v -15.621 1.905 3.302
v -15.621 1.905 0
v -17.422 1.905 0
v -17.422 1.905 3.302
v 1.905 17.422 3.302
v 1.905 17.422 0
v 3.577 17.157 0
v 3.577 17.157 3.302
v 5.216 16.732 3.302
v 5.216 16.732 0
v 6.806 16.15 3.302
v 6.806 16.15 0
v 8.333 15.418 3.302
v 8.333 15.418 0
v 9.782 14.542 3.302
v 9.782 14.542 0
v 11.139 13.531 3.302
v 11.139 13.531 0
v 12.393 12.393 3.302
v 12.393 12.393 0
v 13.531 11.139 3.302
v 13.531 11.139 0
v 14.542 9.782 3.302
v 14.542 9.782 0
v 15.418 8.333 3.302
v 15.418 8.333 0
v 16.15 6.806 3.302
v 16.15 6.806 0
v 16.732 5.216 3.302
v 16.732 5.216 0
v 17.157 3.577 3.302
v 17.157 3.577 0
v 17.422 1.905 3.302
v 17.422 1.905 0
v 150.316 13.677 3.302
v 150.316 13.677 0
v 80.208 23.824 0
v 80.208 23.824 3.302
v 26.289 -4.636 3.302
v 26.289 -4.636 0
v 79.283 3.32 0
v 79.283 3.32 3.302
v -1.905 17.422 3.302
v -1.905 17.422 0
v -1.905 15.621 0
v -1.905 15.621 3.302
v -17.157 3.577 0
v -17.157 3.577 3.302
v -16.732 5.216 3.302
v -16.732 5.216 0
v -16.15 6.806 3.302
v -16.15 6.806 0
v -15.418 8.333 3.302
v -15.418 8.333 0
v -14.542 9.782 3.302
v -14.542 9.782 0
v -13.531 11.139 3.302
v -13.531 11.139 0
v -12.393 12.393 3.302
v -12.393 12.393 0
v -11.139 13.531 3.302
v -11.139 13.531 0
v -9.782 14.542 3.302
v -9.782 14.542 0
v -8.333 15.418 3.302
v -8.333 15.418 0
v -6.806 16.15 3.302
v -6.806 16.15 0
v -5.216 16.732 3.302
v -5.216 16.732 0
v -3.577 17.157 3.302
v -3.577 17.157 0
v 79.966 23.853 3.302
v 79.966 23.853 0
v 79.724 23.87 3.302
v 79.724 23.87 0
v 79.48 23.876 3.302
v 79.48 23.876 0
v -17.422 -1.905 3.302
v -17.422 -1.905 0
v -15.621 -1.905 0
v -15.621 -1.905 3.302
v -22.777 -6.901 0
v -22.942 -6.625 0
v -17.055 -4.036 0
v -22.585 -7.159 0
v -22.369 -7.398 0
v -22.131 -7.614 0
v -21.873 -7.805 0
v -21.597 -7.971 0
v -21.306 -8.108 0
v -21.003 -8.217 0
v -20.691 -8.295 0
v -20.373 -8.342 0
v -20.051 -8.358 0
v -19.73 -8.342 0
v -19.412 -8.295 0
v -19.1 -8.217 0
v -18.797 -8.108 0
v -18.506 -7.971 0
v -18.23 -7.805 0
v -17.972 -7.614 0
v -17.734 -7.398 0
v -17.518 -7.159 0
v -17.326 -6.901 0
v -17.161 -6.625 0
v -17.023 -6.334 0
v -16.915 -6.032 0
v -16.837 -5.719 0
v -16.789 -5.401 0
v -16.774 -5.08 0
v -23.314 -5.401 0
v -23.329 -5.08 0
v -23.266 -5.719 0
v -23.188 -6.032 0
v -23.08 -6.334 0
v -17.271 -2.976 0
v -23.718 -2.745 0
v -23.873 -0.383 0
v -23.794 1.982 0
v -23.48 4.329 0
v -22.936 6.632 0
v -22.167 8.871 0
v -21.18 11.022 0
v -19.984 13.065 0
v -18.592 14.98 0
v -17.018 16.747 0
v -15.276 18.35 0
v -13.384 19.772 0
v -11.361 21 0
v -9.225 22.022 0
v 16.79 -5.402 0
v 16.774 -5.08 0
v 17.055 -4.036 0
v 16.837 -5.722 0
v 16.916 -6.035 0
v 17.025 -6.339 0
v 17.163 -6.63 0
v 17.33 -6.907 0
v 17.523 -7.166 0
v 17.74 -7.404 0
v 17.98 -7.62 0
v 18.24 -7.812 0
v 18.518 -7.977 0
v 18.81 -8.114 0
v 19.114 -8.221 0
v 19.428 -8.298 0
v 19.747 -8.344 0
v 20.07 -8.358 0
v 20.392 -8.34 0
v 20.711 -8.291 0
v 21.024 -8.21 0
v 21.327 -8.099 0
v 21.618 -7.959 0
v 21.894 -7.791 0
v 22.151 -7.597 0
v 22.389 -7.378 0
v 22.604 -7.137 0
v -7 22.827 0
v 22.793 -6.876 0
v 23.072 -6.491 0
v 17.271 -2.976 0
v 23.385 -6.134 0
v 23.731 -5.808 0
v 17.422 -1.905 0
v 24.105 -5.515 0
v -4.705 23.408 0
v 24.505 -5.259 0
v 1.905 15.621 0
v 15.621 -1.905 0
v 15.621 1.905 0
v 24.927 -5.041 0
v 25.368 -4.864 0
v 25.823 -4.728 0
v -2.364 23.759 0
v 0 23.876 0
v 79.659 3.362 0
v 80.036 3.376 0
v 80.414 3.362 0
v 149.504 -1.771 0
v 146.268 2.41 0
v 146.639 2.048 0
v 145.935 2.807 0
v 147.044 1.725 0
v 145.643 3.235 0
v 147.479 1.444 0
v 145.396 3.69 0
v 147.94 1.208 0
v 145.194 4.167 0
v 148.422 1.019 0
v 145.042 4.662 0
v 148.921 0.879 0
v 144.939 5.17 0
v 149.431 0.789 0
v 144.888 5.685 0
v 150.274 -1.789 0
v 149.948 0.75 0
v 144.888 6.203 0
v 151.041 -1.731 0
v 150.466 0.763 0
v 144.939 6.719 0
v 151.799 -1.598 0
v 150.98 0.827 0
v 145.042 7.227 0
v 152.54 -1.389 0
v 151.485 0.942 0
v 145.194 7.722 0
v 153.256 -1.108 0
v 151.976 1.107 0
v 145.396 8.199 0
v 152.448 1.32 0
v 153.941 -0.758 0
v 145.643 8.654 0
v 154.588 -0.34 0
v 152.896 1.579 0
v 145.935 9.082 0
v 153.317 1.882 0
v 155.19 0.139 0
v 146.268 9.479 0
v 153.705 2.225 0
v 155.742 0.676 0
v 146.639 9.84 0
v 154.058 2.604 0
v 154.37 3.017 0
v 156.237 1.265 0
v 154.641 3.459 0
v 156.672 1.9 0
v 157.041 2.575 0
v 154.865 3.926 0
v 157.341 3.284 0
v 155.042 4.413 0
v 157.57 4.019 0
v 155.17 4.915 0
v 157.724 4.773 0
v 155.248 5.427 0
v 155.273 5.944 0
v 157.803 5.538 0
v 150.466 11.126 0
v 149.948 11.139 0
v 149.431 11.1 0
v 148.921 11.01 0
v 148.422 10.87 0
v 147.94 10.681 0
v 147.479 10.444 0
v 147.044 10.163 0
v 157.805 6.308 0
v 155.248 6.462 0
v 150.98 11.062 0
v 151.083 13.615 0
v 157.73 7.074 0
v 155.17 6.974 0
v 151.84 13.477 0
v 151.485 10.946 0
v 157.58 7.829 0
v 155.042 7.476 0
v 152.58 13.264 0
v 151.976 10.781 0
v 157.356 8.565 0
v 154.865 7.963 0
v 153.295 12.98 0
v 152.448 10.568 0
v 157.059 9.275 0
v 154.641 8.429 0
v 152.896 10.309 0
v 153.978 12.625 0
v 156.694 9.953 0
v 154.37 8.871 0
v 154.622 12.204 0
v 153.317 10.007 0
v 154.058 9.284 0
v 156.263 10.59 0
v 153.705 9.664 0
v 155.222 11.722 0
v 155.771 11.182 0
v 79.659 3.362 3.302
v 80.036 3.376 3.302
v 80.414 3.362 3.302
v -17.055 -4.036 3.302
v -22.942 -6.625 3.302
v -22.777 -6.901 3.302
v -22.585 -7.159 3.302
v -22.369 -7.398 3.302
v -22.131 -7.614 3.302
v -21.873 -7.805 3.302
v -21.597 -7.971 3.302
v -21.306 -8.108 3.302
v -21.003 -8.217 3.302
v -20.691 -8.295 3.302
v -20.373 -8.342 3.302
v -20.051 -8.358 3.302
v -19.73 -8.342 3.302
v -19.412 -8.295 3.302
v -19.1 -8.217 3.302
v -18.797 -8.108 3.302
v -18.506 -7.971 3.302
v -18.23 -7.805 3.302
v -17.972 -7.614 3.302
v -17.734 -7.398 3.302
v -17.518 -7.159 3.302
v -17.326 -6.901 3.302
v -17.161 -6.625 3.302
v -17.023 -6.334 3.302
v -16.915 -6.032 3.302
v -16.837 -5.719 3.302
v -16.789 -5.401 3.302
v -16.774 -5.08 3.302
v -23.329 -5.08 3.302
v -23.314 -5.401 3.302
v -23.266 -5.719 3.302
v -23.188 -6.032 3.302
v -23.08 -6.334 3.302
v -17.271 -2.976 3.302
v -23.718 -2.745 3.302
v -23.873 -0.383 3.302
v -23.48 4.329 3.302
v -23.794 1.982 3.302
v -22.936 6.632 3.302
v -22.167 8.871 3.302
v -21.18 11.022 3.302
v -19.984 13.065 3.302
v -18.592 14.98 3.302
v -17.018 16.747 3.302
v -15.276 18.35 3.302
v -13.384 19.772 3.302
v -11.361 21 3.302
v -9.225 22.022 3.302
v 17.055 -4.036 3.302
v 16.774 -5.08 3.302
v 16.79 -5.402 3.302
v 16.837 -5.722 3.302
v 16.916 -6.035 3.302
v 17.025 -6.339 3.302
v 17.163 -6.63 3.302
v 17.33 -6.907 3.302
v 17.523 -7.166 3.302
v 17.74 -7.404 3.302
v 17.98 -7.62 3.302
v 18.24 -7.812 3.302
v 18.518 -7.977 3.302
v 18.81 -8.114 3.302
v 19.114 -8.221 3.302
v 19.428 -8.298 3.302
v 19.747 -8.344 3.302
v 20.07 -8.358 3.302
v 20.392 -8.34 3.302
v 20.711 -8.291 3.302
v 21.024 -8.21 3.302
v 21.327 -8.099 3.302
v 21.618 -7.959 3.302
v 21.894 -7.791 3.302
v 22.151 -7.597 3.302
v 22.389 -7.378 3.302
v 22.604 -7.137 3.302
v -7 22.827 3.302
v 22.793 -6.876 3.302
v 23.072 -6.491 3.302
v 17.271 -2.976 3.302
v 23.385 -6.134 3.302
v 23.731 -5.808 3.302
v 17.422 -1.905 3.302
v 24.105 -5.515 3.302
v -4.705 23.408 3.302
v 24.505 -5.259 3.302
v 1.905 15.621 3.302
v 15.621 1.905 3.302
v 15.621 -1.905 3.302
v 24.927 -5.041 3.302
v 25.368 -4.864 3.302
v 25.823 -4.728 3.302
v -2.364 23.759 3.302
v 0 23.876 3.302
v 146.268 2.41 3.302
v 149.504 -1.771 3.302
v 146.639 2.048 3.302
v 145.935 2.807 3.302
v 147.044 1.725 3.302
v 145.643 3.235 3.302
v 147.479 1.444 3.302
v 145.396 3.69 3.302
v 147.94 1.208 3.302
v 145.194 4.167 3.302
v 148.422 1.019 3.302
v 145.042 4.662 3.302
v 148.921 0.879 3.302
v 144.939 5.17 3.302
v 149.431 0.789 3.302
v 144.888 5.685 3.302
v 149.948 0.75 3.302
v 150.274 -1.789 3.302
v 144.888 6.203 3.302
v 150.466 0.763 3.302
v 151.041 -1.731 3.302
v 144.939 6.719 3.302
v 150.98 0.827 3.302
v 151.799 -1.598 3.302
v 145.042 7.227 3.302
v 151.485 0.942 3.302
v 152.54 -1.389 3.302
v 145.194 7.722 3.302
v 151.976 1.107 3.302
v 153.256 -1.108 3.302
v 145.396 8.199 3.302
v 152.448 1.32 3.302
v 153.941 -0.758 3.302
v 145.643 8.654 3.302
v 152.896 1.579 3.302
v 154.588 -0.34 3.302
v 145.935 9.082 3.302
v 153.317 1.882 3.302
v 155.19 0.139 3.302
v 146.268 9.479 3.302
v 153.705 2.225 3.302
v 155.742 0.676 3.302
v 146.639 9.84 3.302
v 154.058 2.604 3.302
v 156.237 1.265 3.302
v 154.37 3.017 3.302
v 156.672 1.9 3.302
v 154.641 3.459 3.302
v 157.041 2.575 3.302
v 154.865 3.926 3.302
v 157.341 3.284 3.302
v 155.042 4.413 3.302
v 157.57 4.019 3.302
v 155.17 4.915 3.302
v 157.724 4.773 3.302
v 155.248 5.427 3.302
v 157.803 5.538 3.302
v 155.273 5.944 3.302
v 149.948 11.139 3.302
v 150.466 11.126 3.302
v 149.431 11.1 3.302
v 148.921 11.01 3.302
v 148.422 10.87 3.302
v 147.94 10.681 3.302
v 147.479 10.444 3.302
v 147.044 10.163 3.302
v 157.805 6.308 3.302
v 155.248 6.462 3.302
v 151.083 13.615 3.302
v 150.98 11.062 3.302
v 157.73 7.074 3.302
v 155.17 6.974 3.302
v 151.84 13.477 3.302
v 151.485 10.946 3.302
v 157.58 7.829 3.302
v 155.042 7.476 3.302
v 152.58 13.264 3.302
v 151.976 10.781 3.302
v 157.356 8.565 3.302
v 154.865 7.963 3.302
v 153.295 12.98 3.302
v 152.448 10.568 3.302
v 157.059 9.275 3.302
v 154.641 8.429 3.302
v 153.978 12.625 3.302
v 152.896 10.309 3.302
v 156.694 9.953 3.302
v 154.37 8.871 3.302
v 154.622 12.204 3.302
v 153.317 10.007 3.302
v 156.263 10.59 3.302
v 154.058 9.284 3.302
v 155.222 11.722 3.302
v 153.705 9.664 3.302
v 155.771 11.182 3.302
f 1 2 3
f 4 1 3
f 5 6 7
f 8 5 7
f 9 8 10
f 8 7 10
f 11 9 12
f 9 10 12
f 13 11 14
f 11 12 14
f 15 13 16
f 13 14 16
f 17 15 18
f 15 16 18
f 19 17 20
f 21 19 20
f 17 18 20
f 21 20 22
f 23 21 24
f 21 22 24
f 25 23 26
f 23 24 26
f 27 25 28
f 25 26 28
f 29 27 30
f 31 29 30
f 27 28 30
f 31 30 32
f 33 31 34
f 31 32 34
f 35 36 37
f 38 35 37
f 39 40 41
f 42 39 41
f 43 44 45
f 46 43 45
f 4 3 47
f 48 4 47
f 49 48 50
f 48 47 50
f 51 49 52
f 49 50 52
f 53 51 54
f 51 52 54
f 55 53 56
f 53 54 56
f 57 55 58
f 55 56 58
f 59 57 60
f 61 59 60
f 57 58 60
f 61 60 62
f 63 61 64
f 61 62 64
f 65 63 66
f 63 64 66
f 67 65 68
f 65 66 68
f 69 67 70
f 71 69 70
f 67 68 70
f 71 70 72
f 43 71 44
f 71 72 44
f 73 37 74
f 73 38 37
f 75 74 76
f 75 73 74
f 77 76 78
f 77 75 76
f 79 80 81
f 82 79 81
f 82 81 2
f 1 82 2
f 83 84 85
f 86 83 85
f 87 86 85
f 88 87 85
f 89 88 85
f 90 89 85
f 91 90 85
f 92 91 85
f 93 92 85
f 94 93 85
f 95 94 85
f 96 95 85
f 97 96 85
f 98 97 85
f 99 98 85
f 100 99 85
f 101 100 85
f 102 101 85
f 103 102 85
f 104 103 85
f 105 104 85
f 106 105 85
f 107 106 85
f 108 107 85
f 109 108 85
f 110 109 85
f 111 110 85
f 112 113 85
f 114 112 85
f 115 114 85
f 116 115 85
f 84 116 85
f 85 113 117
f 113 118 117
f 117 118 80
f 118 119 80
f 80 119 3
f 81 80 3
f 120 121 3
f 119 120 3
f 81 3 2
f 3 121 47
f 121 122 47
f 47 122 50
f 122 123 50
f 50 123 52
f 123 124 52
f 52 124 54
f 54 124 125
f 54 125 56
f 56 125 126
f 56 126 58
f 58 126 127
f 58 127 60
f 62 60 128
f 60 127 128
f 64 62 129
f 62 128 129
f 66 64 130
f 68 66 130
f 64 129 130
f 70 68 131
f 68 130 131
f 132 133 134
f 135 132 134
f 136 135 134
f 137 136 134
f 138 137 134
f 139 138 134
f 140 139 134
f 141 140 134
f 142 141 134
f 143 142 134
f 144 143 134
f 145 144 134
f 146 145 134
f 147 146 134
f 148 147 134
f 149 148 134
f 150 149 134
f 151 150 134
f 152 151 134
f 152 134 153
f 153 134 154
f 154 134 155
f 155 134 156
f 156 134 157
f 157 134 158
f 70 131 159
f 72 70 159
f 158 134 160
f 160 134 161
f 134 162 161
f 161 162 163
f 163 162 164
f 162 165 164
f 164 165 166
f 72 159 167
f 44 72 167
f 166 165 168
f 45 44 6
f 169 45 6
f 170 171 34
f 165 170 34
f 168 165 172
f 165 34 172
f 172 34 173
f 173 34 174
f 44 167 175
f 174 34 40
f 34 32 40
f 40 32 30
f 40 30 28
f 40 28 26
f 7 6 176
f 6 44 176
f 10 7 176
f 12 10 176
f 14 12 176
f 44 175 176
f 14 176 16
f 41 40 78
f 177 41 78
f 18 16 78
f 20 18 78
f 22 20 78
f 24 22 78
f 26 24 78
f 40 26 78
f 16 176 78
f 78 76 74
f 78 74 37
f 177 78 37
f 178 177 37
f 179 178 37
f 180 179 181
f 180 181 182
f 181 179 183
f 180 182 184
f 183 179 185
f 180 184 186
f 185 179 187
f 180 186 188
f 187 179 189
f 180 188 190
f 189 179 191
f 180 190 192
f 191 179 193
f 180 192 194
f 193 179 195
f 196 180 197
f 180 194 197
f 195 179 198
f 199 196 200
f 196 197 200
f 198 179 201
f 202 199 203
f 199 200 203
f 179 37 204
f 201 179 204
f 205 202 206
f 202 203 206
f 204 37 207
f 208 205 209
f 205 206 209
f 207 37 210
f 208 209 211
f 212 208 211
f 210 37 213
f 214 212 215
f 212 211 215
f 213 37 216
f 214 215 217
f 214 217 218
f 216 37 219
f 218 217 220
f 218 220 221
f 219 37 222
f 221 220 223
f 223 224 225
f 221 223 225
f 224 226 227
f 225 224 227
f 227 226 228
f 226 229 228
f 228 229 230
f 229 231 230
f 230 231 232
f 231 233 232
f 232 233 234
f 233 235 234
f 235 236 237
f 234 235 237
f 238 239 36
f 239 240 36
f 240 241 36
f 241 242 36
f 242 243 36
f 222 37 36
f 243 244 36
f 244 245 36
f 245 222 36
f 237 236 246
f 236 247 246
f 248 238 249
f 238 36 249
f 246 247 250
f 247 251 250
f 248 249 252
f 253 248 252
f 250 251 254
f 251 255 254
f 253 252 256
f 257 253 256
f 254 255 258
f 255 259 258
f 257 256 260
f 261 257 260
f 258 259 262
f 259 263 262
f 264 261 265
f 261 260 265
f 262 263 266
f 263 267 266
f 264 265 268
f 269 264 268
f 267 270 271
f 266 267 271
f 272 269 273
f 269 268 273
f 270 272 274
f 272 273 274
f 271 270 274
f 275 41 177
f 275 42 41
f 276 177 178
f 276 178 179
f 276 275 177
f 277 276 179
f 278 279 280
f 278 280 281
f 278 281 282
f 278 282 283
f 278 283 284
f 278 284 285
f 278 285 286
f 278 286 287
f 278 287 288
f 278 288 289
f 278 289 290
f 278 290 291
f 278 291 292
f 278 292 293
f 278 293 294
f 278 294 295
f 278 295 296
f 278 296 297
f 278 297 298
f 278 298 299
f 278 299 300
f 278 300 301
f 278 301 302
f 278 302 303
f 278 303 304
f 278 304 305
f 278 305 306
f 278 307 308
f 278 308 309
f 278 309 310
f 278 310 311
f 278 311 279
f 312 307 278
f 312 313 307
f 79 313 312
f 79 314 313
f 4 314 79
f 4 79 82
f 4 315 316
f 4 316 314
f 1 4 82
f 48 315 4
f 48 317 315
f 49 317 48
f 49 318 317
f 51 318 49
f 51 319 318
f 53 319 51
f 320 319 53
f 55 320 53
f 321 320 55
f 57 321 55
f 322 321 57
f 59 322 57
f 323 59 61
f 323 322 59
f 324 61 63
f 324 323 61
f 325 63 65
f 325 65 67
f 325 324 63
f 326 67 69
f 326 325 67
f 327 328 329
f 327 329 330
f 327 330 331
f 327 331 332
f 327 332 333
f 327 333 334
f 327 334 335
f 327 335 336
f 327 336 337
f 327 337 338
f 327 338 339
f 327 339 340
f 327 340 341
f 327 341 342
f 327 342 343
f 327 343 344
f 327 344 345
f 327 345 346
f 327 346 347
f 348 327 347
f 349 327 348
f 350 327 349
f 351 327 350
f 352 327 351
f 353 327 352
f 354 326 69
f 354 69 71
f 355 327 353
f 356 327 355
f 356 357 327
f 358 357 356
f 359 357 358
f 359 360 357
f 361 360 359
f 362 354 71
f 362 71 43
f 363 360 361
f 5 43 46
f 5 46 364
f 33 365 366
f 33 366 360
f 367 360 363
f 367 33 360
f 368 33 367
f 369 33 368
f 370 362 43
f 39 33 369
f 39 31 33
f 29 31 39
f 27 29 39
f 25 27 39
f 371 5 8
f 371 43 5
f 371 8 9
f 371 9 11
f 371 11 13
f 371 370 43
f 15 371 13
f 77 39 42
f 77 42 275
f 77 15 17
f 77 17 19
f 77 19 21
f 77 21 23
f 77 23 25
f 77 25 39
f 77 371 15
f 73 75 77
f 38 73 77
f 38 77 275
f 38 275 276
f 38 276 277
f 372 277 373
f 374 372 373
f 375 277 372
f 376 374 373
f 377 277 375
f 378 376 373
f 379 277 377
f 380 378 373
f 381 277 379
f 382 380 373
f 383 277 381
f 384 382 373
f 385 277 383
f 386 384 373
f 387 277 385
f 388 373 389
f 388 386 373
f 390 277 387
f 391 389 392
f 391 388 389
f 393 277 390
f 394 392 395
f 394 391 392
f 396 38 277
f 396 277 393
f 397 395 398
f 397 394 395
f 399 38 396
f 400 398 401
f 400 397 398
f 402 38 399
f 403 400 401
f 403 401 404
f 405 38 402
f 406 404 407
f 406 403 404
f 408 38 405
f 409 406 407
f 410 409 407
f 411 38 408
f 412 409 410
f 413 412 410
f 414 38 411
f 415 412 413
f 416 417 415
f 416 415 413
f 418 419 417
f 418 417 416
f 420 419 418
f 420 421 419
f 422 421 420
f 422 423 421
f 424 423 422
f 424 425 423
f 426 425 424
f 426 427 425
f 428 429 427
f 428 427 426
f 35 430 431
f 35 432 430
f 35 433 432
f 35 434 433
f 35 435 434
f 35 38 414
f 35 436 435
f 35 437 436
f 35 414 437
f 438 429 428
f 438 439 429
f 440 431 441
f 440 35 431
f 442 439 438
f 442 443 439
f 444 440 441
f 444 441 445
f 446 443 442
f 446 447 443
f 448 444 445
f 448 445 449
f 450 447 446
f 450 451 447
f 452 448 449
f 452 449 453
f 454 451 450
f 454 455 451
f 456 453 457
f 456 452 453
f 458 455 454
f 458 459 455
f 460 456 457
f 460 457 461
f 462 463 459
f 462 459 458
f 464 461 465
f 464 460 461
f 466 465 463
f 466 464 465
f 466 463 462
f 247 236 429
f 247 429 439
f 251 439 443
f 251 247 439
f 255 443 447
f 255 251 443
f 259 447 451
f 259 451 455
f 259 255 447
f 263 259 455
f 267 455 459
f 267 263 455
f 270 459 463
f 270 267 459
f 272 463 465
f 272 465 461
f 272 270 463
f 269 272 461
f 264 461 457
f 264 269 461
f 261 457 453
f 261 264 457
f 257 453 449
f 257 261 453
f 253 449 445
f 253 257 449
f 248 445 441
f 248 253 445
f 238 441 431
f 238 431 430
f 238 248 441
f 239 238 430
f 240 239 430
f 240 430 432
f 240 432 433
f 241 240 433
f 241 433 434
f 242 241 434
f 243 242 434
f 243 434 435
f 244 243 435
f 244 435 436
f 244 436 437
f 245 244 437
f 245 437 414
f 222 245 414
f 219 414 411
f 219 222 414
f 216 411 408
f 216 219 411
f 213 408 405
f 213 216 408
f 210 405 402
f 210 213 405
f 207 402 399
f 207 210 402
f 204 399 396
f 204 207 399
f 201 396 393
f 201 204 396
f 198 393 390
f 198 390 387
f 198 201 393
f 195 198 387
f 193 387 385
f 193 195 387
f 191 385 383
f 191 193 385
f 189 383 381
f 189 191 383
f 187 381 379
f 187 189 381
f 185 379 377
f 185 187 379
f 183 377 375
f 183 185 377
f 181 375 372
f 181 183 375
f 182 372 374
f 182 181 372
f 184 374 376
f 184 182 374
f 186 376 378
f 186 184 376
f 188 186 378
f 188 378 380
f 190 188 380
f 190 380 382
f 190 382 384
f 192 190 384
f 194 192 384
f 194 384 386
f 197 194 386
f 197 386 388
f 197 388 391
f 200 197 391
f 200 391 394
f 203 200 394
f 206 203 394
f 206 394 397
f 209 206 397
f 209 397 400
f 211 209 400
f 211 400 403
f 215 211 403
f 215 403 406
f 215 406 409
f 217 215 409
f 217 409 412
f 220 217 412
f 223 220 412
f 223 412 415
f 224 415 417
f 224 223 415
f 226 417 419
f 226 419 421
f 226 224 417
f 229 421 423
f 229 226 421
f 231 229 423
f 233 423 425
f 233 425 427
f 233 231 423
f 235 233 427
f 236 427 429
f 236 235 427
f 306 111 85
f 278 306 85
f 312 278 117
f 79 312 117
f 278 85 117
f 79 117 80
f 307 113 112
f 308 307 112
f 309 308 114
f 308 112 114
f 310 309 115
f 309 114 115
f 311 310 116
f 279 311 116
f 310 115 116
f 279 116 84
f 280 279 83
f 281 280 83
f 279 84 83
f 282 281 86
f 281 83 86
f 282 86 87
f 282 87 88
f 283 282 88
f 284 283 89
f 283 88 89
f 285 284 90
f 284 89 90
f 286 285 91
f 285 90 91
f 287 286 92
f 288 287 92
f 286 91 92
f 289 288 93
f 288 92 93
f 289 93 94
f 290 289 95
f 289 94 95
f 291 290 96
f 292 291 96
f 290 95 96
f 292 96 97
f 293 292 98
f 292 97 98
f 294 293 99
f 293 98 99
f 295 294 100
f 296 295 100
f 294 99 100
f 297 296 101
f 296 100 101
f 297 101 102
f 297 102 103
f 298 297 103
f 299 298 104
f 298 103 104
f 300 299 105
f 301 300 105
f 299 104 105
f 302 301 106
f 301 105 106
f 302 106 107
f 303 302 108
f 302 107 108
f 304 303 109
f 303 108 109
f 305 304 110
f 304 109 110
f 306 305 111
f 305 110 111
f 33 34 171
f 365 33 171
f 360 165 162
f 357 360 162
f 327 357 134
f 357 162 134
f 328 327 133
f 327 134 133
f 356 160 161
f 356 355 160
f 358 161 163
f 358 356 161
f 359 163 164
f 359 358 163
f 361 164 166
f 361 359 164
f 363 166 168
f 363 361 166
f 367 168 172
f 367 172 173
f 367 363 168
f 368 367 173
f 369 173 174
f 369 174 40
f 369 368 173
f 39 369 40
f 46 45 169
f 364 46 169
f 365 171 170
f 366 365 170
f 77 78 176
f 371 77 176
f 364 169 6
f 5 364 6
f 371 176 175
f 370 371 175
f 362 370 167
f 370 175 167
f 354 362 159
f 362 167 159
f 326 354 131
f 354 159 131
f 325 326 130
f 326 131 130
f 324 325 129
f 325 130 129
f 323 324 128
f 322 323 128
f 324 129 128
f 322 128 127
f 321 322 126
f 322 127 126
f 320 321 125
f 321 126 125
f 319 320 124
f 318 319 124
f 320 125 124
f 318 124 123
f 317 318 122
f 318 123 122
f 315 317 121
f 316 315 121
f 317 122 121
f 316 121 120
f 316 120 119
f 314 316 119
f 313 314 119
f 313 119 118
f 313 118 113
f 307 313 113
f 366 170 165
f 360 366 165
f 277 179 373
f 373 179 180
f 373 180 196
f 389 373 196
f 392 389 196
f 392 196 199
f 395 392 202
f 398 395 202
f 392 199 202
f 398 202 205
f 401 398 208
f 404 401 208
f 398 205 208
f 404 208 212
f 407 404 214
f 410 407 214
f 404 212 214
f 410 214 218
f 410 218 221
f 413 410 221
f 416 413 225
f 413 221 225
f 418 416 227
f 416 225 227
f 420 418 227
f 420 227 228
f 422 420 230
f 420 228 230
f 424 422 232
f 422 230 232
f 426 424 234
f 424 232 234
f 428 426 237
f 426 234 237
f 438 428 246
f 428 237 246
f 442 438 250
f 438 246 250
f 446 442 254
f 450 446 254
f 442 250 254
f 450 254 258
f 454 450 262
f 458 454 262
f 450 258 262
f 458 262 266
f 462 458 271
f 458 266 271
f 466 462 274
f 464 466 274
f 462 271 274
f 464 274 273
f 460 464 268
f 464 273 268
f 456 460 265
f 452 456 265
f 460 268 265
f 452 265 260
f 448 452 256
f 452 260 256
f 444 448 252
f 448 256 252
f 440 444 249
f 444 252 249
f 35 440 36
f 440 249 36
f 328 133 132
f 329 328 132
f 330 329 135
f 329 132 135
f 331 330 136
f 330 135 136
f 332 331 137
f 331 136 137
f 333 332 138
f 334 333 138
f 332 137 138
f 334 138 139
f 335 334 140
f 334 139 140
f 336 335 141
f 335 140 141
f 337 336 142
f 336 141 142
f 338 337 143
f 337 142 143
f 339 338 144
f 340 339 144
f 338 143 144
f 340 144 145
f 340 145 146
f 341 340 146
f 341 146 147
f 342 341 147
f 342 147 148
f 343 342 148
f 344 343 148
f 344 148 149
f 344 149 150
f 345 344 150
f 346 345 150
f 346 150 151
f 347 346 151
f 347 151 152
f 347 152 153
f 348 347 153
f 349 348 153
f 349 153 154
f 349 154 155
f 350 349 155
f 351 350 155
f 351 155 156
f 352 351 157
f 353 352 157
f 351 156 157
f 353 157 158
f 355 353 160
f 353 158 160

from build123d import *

# Parameters (mm, degrees)
F0_R     = 5.196102
F1_DEPTH = 3.302
F2_R     = 5.08


with BuildPart() as f1:
    # F0 (on Top) → F1 (new body)
    with BuildSketch(Plane.XY):
        with BuildLine():
            ThreePointArc((17.42216, -1.905), (17.171429, -3.507522), (16.773618, -5.08))
            ThreePointArc((16.773618, -5.08), (20.051467, -8.357849), (23.329316, -5.08))
            Line((23.329316, -5.08), (79.846062, 3.404097))
            Line((79.846062, 3.404097), (149.504127, -1.770501))
            ThreePointArc((149.504127, -1.770501), (157.802675, 5.538416), (150.315792, 13.676766))
            Line((150.315792, 13.676766), (79.846062, 23.876))
            Line((79.846062, 23.876), (0, 23.876))
            ThreePointArc((0, 23.876), (-18.592384, 14.979541), (-23.329316, -5.08))
            ThreePointArc((-23.329316, -5.08), (-20.051467, -8.357849), (-16.773618, -5.08))
            ThreePointArc((-16.773618, -5.08), (-17.171429, -3.507522), (-17.42216, -1.905))
            ThreePointArc((-17.42216, -1.905), (-17.526, 0), (-17.42216, 1.905))
            ThreePointArc((-17.42216, 1.905), (-12.392753, 12.392753), (-1.905, 17.42216))
            ThreePointArc((-1.905, 17.42216), (0, 17.526), (1.905, 17.42216))
            ThreePointArc((1.905, 17.42216), (12.392753, 12.392753), (17.42216, 1.905))
            ThreePointArc((17.42216, 1.905), (17.526, 0), (17.42216, -1.905))
        make_face()
        with Locations((150.07723, 5.944343)):
            Circle(F0_R, mode=Mode.SUBTRACT)
        with BuildLine():
            Line((1.905, 15.621), (1.905, 17.42216))
            ThreePointArc((1.905, 17.42216), (0, 17.526), (-1.905, 17.42216))
            Line((-1.905, 17.42216), (-1.905, 15.621))
            Line((-1.905, 15.621), (1.905, 15.621))
        make_face()
        with BuildLine():
            Line((15.621, -1.905), (17.42216, -1.905))
            ThreePointArc((17.42216, -1.905), (17.526, 0), (17.42216, 1.905))
            Line((17.42216, 1.905), (15.621, 1.905))
            Line((15.621, 1.905), (15.621, -1.905))
        make_face()
        with BuildLine():
            Line((-15.621, 1.905), (-17.42216, 1.905))
            ThreePointArc((-17.42216, 1.905), (-17.526, 0), (-17.42216, -1.905))
            Line((-17.42216, -1.905), (-15.621, -1.905))
            Line((-15.621, -1.905), (-15.621, 1.905))
        make_face()
    extrude(amount=F1_DEPTH)

    # F2
    f2_edges = [f1.edges().sort_by_distance(p)[0] for p in [
        (23.329316, -5.08, 1.651),
        (79.846062, 3.404097, 1.651),
        (79.846062, 23.876, 1.651),
    ]]
    fillet(f2_edges, radius=F2_R)


solid = f1.part
